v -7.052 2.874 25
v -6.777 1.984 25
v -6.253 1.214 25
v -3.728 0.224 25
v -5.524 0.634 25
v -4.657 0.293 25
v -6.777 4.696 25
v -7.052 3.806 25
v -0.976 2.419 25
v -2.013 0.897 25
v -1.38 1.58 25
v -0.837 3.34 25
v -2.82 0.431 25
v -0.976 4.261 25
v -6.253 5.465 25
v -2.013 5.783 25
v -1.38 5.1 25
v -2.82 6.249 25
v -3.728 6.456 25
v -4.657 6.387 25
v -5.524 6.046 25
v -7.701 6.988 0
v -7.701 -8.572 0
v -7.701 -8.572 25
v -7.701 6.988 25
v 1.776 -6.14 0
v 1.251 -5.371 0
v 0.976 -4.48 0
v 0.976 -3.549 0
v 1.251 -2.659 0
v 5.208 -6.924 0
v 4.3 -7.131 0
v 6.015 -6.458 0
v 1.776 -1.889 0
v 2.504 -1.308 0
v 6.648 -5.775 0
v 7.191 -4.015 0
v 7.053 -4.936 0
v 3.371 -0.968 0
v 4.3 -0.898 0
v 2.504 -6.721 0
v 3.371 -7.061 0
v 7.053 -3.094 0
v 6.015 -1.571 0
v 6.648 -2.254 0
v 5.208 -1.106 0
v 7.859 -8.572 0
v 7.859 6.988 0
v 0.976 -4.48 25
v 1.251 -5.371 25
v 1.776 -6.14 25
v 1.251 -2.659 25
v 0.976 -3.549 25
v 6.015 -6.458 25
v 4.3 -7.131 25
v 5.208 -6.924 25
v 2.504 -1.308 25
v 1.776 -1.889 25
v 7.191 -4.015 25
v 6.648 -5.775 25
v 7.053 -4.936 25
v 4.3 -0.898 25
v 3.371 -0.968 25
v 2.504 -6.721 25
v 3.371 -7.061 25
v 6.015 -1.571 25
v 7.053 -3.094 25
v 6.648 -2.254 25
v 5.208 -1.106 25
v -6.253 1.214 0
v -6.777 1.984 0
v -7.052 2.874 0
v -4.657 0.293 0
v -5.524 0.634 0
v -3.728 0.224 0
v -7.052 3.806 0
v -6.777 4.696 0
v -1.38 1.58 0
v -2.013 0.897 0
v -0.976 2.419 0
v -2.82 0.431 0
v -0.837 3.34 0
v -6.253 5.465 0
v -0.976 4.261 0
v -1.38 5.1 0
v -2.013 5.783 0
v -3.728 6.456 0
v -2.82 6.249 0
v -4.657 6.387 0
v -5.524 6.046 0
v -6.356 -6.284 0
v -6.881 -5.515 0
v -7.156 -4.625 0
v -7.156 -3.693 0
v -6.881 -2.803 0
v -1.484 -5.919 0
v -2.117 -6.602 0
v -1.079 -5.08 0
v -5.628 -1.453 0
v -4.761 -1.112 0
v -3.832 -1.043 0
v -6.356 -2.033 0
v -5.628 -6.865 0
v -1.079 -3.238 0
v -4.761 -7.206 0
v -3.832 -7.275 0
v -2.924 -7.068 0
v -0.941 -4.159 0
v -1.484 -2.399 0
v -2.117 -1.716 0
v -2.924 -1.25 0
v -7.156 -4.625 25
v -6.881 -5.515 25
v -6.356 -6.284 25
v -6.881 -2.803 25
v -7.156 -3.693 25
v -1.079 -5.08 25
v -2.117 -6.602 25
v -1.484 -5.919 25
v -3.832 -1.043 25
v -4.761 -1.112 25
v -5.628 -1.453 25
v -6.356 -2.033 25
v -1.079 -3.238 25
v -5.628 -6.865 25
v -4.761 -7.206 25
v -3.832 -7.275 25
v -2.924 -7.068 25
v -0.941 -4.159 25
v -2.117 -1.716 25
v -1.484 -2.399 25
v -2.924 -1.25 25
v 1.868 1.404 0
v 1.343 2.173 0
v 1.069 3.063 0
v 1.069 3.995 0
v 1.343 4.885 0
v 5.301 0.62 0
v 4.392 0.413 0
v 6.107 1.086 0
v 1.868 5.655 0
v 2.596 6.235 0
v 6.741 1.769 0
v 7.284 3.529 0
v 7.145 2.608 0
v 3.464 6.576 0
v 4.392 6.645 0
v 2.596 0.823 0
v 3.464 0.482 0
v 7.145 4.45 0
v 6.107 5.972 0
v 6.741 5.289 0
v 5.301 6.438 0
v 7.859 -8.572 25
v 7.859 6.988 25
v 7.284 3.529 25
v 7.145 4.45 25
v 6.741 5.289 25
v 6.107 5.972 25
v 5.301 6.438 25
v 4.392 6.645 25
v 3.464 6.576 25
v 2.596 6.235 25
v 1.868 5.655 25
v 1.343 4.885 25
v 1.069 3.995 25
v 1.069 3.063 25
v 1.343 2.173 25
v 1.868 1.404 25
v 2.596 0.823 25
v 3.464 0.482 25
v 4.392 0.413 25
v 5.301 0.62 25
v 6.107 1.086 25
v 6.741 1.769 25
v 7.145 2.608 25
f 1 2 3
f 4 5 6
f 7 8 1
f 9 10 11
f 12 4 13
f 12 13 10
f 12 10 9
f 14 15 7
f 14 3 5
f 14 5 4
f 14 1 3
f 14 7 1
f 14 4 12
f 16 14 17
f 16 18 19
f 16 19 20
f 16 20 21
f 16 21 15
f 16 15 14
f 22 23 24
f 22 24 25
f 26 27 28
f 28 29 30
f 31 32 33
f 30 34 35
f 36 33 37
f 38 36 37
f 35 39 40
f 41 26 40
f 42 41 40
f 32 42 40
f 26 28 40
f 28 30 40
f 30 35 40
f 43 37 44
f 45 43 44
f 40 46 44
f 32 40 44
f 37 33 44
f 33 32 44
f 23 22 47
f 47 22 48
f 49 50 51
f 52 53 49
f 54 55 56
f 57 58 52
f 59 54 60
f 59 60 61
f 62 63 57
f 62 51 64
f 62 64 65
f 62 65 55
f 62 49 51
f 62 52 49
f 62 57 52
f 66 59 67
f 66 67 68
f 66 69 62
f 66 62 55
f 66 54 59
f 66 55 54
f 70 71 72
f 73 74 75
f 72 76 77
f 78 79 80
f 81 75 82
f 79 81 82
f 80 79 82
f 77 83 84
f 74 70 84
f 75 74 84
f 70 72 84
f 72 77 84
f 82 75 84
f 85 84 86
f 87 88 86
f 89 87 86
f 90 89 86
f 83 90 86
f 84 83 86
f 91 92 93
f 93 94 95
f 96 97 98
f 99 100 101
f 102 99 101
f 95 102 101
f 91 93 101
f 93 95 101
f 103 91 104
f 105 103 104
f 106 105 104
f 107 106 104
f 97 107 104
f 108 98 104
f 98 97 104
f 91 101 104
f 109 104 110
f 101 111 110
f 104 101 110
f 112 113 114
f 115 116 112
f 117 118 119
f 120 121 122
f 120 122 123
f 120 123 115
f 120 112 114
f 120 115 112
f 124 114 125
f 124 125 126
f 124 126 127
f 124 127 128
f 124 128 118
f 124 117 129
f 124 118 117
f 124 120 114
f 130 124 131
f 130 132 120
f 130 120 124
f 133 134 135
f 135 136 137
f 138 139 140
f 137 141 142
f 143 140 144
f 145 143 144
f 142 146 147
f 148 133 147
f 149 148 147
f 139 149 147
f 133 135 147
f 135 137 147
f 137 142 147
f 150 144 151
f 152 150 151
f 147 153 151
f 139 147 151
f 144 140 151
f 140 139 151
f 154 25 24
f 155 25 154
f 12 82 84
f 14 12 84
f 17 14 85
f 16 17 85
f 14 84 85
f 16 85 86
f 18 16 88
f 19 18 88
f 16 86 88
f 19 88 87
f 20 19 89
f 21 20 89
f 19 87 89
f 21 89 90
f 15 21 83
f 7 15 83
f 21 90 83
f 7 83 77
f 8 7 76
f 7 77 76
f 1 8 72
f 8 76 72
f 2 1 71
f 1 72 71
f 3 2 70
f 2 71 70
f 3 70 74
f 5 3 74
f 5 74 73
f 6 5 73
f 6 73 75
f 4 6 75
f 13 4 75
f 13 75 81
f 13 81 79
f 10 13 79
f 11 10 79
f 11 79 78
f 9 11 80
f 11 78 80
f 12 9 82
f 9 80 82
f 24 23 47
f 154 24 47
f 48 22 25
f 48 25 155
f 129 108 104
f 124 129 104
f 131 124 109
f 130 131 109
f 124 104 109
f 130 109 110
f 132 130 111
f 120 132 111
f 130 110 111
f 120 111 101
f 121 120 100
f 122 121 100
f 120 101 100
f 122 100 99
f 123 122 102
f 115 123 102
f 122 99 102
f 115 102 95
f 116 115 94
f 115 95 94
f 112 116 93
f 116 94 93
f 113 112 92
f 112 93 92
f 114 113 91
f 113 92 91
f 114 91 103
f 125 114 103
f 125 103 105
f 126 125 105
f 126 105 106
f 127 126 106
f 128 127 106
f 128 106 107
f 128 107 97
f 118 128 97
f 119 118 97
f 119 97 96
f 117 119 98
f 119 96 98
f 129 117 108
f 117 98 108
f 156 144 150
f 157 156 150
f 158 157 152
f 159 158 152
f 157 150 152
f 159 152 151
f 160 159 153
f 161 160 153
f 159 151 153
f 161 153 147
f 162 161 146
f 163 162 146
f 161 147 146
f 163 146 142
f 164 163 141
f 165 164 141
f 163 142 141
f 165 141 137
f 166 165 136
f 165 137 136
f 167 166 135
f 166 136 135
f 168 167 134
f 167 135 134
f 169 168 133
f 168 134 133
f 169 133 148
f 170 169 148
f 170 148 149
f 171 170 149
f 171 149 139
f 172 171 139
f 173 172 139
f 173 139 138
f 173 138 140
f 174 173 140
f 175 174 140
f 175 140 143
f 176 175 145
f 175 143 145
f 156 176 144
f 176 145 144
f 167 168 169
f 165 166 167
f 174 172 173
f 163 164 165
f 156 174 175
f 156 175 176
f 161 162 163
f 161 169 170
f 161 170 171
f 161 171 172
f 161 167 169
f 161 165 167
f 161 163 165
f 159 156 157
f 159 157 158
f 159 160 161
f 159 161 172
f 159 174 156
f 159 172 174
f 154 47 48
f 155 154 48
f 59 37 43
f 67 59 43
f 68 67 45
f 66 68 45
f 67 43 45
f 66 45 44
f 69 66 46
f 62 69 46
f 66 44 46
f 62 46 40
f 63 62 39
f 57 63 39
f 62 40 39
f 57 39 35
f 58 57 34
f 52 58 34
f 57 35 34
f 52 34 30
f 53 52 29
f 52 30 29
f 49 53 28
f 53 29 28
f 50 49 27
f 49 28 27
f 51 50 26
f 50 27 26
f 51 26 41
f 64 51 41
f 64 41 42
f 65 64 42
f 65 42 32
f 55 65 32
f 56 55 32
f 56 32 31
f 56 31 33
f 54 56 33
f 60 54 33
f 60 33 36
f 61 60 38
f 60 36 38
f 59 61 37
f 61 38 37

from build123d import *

# Parameters (mm, degrees)
F0_W     = 15.56
F0_H     = 15.56
F2_DEPTH = 25
F1_R     = 3.125


with BuildPart() as f2:
    # F0 (on Top) → F2 (new body)
    with BuildSketch(Plane.XY):
        with Locations((0.0785020094, -0.7916040632)):
            Rectangle(F0_W, F0_H)
    extrude(amount=F2_DEPTH)


with BuildPart() as f2b:
    # F1 (on Top) → F2, piece 2 (new body)
    with BuildSketch(Plane.XY):
        with Locations((-3.9618849667, 3.3398911009)):
            Circle(F1_R)
    extrude(amount=F2_DEPTH)


with BuildPart() as f2c:
    # F1 (on Top) → F2, piece 3 (new body)
    with BuildSketch(Plane.XY):
        with Locations((4.1588830674, 3.5291202986)):
            Circle(F1_R)
    extrude(amount=F2_DEPTH)


with BuildPart() as f2d:
    # F1 (on Top) → F2, piece 4 (new body)
    with BuildSketch(Plane.XY):
        with Locations((-4.0655138512, -4.1589550173)):
            Circle(F1_R)
    extrude(amount=F2_DEPTH)


with BuildPart() as f2e:
    # F1 (on Top) → F2, piece 5 (new body)
    with BuildSketch(Plane.XY):
        with Locations((4.0664936555, -4.0146590518)):
            Circle(F1_R)
    extrude(amount=F2_DEPTH)


solid = Compound([f2.part, f2b.part, f2c.part, f2d.part, f2e.part])
